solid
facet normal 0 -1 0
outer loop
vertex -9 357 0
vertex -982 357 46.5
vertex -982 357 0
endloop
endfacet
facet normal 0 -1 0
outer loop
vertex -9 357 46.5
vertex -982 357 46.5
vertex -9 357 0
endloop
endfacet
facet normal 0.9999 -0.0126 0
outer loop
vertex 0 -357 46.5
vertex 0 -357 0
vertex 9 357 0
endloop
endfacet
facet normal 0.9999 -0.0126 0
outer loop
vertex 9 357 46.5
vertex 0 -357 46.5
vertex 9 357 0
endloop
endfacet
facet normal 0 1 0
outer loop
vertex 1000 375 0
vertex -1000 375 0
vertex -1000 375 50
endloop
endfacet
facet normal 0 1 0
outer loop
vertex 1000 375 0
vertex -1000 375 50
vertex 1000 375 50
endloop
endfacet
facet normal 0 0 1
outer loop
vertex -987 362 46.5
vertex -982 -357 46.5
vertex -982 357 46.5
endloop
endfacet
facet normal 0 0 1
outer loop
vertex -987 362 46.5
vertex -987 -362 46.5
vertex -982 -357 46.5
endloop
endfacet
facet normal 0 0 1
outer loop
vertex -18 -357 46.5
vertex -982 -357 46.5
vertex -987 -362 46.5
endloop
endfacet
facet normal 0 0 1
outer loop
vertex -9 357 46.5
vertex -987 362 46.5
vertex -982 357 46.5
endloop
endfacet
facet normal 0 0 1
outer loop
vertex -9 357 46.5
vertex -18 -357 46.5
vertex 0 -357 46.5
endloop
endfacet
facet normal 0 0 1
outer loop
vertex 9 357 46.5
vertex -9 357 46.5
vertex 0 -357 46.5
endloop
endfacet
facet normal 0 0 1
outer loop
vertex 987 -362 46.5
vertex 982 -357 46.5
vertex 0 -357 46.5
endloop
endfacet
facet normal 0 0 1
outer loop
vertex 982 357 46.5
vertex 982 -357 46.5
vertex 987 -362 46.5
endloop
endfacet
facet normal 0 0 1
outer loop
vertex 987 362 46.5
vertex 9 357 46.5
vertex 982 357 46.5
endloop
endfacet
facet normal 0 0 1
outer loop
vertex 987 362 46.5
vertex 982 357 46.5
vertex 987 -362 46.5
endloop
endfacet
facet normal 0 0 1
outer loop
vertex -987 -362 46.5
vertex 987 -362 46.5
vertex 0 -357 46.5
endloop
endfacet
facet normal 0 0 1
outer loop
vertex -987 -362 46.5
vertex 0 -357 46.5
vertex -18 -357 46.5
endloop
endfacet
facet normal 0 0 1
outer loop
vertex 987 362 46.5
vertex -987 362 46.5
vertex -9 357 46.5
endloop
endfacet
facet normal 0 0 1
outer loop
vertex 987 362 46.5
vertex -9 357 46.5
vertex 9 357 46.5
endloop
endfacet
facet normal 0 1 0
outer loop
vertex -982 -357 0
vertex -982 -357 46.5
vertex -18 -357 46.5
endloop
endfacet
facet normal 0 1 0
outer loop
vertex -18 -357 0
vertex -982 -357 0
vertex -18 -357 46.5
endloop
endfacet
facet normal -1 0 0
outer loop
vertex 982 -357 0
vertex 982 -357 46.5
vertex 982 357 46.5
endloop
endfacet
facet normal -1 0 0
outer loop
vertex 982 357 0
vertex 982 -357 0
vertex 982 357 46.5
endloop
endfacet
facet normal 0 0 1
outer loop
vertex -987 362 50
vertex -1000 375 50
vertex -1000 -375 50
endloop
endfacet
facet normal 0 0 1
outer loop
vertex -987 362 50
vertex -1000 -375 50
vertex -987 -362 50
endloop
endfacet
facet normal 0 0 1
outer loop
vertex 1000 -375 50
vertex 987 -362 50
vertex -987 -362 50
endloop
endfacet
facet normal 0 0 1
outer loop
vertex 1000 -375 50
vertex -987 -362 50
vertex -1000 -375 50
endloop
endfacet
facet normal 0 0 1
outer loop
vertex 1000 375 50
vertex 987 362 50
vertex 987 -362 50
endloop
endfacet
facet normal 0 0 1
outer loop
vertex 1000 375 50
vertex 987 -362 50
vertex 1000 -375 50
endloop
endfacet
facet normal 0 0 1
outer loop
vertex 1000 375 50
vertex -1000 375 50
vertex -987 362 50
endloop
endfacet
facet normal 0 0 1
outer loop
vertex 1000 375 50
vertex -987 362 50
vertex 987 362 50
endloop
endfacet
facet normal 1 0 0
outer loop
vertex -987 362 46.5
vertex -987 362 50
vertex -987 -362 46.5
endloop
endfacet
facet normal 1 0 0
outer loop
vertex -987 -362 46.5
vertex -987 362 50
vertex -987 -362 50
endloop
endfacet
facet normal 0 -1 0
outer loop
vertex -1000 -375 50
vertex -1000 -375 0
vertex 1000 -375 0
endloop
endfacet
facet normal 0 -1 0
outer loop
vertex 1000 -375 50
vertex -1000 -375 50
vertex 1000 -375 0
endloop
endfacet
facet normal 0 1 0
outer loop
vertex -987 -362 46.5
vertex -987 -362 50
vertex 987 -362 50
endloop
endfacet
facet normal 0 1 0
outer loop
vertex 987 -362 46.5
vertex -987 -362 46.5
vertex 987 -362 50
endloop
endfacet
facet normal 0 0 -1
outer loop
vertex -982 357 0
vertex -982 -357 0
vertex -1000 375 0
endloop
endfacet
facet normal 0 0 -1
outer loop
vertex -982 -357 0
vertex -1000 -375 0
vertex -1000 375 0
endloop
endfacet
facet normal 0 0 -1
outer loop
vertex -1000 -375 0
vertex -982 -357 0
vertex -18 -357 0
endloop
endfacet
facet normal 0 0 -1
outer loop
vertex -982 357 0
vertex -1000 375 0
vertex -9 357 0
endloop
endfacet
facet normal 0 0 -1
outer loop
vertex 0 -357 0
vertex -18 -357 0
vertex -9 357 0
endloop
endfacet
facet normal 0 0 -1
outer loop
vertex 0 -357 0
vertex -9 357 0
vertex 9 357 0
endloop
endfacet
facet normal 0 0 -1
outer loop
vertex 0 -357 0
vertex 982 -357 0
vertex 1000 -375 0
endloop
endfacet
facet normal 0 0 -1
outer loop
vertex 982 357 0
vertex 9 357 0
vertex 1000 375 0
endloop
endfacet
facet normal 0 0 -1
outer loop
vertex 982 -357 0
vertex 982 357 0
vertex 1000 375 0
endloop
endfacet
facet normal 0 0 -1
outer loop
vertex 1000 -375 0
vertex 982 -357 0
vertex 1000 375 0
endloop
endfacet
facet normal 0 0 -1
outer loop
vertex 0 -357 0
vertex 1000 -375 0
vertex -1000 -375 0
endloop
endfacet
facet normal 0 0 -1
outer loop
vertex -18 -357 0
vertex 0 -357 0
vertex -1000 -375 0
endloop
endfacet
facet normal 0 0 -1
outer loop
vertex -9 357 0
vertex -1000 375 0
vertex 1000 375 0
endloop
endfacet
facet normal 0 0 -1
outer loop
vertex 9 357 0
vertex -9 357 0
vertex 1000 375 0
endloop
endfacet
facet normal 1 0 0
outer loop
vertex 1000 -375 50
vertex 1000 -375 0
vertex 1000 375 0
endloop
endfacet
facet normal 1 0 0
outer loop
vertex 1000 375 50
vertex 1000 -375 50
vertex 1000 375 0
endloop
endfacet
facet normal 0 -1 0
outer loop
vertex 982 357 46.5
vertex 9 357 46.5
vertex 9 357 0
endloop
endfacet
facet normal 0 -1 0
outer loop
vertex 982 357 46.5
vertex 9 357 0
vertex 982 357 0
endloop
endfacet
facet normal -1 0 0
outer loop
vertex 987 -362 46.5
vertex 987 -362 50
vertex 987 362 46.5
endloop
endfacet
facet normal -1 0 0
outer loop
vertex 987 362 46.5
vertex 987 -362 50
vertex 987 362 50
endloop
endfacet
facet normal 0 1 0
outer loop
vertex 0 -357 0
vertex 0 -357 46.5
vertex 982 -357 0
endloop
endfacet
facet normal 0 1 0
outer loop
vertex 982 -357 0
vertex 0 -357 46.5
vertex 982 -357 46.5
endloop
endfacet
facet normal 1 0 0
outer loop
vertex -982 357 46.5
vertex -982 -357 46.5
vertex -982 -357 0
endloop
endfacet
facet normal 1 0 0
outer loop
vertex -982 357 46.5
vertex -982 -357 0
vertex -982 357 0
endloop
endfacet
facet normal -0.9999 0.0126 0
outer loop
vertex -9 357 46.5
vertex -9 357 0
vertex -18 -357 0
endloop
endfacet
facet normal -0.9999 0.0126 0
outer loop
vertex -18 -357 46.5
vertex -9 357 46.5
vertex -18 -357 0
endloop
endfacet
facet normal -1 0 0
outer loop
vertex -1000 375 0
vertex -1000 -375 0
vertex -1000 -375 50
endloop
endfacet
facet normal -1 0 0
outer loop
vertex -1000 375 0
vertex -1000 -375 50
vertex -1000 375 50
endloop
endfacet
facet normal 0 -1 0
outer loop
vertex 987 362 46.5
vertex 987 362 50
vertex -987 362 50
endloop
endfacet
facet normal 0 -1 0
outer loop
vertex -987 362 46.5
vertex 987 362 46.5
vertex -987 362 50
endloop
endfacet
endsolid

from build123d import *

# Parameters (mm, degrees)
F0_W     = 2000
F0_H     = 750
F1_DEPTH = 50
F2_T     = -18
F3_DEPTH = 25
F5_DEPTH = 46.5
F6_W     = 1964
F6_H     = 714
F7_DEPTH = 3.5


with BuildPart() as f1:
    # F0 (on Top) → F1 (new body)
    with BuildSketch(Plane.XY):
        Rectangle(F0_W, F0_H)
    extrude(amount=F1_DEPTH)

    # F2
    f2_openings = [f1.faces().sort_by_distance(p)[0] for p in [
        (0, 0, 50),
    ]]
    offset(amount=F2_T, openings=f2_openings)

    # F3 (cut): a face of the model
    f3_faces = [f1.faces().sort_by_distance(p)[0] for p in [
        (0, 0, 18),
    ]]
    extrude(f3_faces, amount=-F3_DEPTH, mode=Mode.SUBTRACT)

    # F4 (on face) → F5 (join)
    with BuildSketch(Plane.XY):
        Polygon((9, 357), (0, 357), (-9, 357), (-18, -357), (0, -357), align=None)
    extrude(amount=F5_DEPTH)

    # F6 (on face) → F7 (cut)
    with BuildSketch(Plane.XY.offset(50)):
        Polygon((982, 362), (-982, 362), (-987, 362), (-987, 357), (-987, -357), (-987, -362), (-982, -362), (982, -362), (987, -362), (987, -357), (987, 357), (987, 362), align=None)
        Rectangle(F6_W, F6_H, mode=Mode.SUBTRACT)
    extrude(amount=-F7_DEPTH, mode=Mode.SUBTRACT)


solid = f1.part
